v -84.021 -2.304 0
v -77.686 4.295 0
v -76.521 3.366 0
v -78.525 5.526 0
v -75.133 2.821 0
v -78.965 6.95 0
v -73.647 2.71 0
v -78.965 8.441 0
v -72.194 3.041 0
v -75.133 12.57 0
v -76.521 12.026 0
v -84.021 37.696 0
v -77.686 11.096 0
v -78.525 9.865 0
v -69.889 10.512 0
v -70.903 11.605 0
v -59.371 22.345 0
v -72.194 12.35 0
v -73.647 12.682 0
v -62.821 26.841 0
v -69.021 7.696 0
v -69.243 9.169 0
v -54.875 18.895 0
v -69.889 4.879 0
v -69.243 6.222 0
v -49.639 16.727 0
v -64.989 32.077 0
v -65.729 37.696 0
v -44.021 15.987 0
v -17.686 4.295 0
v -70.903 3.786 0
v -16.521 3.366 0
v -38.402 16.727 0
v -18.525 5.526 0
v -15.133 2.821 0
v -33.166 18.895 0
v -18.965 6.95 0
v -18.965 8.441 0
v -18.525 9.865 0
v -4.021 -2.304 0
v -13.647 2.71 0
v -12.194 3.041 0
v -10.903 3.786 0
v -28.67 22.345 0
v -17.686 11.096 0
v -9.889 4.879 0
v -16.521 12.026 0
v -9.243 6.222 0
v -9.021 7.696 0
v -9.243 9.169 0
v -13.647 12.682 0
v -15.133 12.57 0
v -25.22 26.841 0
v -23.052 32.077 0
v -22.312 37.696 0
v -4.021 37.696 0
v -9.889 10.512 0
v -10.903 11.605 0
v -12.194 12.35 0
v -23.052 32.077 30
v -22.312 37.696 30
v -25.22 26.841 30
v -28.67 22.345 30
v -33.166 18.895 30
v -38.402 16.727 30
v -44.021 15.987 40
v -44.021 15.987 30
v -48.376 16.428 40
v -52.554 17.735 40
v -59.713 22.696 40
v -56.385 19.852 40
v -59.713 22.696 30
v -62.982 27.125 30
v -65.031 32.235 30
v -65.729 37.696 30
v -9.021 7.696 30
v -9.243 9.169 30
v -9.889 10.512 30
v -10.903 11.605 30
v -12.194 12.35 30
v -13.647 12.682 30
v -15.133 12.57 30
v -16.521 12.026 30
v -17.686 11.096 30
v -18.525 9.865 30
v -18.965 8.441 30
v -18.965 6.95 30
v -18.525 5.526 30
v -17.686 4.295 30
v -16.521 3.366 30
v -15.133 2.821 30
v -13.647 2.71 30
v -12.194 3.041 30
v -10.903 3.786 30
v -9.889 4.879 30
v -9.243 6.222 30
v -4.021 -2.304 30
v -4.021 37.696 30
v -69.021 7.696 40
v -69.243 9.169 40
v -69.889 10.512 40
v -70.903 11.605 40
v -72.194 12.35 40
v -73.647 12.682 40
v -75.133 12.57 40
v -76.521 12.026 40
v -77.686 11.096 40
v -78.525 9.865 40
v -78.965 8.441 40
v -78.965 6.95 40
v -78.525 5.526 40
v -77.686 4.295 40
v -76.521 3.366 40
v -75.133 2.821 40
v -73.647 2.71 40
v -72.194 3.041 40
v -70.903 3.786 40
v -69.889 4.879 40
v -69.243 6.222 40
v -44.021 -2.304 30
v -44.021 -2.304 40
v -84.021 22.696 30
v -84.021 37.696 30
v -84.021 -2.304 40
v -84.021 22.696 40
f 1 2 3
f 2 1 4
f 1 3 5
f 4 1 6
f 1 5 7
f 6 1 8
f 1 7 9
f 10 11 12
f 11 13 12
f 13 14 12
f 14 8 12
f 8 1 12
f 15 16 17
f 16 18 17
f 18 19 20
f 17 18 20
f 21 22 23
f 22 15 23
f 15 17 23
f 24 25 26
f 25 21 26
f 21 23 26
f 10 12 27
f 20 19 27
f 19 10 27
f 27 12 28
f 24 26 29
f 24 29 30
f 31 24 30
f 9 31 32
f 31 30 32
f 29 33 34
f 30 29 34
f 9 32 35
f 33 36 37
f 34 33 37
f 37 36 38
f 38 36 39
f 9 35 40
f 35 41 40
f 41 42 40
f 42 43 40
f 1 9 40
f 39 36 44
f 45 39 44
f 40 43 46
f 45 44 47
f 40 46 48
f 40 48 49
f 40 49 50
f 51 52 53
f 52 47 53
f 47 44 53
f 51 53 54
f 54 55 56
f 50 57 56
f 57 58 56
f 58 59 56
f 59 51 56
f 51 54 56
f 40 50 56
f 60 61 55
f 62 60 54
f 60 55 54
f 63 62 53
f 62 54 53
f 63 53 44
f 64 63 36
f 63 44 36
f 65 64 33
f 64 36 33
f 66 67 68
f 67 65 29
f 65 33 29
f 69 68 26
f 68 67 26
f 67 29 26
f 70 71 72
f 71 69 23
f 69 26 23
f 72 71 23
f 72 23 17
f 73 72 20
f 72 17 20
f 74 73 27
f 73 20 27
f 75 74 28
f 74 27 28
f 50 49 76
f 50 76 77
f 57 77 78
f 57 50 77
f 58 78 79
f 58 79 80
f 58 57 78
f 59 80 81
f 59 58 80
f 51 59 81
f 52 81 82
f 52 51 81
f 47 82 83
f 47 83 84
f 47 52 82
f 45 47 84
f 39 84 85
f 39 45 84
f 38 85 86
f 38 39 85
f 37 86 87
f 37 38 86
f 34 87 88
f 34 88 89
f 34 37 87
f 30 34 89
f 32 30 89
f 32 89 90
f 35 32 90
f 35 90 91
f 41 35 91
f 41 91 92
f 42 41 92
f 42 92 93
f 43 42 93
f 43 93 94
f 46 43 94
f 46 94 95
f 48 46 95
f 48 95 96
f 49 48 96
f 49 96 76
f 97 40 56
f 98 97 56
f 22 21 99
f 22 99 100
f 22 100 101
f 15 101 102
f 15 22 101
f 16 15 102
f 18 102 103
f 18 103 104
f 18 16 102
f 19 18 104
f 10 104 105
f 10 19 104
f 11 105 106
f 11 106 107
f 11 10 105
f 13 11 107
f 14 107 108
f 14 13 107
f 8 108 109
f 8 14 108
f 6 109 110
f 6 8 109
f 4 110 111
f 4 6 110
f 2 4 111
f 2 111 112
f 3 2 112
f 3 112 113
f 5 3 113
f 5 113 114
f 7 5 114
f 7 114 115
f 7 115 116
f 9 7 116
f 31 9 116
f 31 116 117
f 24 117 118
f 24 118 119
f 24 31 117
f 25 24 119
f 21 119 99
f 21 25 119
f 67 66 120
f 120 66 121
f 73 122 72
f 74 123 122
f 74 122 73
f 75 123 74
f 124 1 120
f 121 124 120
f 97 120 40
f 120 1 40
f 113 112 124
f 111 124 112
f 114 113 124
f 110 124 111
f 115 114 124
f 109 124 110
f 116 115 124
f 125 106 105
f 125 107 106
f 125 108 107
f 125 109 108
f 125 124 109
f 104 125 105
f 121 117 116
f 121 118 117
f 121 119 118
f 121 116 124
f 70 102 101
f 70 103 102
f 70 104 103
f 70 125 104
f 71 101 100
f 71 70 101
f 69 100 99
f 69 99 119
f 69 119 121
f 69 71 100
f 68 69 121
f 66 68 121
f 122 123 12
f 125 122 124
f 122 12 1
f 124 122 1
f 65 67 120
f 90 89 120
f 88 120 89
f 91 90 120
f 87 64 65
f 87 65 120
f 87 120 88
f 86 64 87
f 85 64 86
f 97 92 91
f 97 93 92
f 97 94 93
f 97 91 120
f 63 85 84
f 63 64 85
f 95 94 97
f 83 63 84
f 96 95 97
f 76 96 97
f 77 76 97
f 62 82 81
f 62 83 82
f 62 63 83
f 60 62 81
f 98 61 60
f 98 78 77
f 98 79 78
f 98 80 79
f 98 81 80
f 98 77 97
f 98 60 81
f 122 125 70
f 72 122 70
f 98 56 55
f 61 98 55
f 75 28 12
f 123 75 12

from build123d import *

# Parameters (mm, degrees)
F0_R     = 5
F1_DEPTH = 40
F2_R     = 5
F3_DEPTH = 10


with BuildPart() as f1:
    # F0 (on Top) → F1 (new body)
    with BuildSketch(Plane.XY):
        with BuildLine():
            Line((-84.020619, -2.304368), (-4.020619, -2.304368))
            Line((-4.020619, -2.304368), (-4.020619, 37.695632))
            Line((-4.020619, 37.695632), (-22.312074, 37.695632))
            ThreePointArc((-22.312074, 37.695632), (-44.020619, 15.987087), (-65.729164, 37.695632))
            Line((-65.729164, 37.695632), (-84.020619, 37.695632))
            Line((-84.020619, 37.695632), (-84.020619, -2.304368))
        make_face()
        with Locations((-74.020619, 7.695632)):
            Circle(F0_R, mode=Mode.SUBTRACT)
        with Locations((-14.020619, 7.695632)):
            Circle(F0_R, mode=Mode.SUBTRACT)
    extrude(amount=F1_DEPTH)

    # F2 (on face) → F3 (cut)
    with BuildSketch(Plane.XY.offset(40)):
        with BuildLine():
            Line((-84.020619, 22.695632), (-59.713322, 22.695632))
            ThreePointArc((-59.713322, 22.695632), (-64.169151, 29.61494), (-65.729164, 37.695632))
            Line((-65.729164, 37.695632), (-84.020619, 37.695632))
            Line((-84.020619, 37.695632), (-84.020619, 22.695632))
        make_face()
        with BuildLine():
            ThreePointArc((-22.312074, 37.695632), (-28.67036, 22.345372), (-44.020619, 15.987087))
            Line((-44.020619, 15.987087), (-44.020619, -2.304368))
            Line((-44.020619, -2.304368), (-4.020619, -2.304368))
            Line((-4.020619, -2.304368), (-4.020619, 37.695632))
            Line((-4.020619, 37.695632), (-22.312074, 37.695632))
        make_face()
        with Locations((-14.020619, 7.695632)):
            Circle(F2_R, mode=Mode.SUBTRACT)
    extrude(amount=-F3_DEPTH, mode=Mode.SUBTRACT)


solid = f1.part
